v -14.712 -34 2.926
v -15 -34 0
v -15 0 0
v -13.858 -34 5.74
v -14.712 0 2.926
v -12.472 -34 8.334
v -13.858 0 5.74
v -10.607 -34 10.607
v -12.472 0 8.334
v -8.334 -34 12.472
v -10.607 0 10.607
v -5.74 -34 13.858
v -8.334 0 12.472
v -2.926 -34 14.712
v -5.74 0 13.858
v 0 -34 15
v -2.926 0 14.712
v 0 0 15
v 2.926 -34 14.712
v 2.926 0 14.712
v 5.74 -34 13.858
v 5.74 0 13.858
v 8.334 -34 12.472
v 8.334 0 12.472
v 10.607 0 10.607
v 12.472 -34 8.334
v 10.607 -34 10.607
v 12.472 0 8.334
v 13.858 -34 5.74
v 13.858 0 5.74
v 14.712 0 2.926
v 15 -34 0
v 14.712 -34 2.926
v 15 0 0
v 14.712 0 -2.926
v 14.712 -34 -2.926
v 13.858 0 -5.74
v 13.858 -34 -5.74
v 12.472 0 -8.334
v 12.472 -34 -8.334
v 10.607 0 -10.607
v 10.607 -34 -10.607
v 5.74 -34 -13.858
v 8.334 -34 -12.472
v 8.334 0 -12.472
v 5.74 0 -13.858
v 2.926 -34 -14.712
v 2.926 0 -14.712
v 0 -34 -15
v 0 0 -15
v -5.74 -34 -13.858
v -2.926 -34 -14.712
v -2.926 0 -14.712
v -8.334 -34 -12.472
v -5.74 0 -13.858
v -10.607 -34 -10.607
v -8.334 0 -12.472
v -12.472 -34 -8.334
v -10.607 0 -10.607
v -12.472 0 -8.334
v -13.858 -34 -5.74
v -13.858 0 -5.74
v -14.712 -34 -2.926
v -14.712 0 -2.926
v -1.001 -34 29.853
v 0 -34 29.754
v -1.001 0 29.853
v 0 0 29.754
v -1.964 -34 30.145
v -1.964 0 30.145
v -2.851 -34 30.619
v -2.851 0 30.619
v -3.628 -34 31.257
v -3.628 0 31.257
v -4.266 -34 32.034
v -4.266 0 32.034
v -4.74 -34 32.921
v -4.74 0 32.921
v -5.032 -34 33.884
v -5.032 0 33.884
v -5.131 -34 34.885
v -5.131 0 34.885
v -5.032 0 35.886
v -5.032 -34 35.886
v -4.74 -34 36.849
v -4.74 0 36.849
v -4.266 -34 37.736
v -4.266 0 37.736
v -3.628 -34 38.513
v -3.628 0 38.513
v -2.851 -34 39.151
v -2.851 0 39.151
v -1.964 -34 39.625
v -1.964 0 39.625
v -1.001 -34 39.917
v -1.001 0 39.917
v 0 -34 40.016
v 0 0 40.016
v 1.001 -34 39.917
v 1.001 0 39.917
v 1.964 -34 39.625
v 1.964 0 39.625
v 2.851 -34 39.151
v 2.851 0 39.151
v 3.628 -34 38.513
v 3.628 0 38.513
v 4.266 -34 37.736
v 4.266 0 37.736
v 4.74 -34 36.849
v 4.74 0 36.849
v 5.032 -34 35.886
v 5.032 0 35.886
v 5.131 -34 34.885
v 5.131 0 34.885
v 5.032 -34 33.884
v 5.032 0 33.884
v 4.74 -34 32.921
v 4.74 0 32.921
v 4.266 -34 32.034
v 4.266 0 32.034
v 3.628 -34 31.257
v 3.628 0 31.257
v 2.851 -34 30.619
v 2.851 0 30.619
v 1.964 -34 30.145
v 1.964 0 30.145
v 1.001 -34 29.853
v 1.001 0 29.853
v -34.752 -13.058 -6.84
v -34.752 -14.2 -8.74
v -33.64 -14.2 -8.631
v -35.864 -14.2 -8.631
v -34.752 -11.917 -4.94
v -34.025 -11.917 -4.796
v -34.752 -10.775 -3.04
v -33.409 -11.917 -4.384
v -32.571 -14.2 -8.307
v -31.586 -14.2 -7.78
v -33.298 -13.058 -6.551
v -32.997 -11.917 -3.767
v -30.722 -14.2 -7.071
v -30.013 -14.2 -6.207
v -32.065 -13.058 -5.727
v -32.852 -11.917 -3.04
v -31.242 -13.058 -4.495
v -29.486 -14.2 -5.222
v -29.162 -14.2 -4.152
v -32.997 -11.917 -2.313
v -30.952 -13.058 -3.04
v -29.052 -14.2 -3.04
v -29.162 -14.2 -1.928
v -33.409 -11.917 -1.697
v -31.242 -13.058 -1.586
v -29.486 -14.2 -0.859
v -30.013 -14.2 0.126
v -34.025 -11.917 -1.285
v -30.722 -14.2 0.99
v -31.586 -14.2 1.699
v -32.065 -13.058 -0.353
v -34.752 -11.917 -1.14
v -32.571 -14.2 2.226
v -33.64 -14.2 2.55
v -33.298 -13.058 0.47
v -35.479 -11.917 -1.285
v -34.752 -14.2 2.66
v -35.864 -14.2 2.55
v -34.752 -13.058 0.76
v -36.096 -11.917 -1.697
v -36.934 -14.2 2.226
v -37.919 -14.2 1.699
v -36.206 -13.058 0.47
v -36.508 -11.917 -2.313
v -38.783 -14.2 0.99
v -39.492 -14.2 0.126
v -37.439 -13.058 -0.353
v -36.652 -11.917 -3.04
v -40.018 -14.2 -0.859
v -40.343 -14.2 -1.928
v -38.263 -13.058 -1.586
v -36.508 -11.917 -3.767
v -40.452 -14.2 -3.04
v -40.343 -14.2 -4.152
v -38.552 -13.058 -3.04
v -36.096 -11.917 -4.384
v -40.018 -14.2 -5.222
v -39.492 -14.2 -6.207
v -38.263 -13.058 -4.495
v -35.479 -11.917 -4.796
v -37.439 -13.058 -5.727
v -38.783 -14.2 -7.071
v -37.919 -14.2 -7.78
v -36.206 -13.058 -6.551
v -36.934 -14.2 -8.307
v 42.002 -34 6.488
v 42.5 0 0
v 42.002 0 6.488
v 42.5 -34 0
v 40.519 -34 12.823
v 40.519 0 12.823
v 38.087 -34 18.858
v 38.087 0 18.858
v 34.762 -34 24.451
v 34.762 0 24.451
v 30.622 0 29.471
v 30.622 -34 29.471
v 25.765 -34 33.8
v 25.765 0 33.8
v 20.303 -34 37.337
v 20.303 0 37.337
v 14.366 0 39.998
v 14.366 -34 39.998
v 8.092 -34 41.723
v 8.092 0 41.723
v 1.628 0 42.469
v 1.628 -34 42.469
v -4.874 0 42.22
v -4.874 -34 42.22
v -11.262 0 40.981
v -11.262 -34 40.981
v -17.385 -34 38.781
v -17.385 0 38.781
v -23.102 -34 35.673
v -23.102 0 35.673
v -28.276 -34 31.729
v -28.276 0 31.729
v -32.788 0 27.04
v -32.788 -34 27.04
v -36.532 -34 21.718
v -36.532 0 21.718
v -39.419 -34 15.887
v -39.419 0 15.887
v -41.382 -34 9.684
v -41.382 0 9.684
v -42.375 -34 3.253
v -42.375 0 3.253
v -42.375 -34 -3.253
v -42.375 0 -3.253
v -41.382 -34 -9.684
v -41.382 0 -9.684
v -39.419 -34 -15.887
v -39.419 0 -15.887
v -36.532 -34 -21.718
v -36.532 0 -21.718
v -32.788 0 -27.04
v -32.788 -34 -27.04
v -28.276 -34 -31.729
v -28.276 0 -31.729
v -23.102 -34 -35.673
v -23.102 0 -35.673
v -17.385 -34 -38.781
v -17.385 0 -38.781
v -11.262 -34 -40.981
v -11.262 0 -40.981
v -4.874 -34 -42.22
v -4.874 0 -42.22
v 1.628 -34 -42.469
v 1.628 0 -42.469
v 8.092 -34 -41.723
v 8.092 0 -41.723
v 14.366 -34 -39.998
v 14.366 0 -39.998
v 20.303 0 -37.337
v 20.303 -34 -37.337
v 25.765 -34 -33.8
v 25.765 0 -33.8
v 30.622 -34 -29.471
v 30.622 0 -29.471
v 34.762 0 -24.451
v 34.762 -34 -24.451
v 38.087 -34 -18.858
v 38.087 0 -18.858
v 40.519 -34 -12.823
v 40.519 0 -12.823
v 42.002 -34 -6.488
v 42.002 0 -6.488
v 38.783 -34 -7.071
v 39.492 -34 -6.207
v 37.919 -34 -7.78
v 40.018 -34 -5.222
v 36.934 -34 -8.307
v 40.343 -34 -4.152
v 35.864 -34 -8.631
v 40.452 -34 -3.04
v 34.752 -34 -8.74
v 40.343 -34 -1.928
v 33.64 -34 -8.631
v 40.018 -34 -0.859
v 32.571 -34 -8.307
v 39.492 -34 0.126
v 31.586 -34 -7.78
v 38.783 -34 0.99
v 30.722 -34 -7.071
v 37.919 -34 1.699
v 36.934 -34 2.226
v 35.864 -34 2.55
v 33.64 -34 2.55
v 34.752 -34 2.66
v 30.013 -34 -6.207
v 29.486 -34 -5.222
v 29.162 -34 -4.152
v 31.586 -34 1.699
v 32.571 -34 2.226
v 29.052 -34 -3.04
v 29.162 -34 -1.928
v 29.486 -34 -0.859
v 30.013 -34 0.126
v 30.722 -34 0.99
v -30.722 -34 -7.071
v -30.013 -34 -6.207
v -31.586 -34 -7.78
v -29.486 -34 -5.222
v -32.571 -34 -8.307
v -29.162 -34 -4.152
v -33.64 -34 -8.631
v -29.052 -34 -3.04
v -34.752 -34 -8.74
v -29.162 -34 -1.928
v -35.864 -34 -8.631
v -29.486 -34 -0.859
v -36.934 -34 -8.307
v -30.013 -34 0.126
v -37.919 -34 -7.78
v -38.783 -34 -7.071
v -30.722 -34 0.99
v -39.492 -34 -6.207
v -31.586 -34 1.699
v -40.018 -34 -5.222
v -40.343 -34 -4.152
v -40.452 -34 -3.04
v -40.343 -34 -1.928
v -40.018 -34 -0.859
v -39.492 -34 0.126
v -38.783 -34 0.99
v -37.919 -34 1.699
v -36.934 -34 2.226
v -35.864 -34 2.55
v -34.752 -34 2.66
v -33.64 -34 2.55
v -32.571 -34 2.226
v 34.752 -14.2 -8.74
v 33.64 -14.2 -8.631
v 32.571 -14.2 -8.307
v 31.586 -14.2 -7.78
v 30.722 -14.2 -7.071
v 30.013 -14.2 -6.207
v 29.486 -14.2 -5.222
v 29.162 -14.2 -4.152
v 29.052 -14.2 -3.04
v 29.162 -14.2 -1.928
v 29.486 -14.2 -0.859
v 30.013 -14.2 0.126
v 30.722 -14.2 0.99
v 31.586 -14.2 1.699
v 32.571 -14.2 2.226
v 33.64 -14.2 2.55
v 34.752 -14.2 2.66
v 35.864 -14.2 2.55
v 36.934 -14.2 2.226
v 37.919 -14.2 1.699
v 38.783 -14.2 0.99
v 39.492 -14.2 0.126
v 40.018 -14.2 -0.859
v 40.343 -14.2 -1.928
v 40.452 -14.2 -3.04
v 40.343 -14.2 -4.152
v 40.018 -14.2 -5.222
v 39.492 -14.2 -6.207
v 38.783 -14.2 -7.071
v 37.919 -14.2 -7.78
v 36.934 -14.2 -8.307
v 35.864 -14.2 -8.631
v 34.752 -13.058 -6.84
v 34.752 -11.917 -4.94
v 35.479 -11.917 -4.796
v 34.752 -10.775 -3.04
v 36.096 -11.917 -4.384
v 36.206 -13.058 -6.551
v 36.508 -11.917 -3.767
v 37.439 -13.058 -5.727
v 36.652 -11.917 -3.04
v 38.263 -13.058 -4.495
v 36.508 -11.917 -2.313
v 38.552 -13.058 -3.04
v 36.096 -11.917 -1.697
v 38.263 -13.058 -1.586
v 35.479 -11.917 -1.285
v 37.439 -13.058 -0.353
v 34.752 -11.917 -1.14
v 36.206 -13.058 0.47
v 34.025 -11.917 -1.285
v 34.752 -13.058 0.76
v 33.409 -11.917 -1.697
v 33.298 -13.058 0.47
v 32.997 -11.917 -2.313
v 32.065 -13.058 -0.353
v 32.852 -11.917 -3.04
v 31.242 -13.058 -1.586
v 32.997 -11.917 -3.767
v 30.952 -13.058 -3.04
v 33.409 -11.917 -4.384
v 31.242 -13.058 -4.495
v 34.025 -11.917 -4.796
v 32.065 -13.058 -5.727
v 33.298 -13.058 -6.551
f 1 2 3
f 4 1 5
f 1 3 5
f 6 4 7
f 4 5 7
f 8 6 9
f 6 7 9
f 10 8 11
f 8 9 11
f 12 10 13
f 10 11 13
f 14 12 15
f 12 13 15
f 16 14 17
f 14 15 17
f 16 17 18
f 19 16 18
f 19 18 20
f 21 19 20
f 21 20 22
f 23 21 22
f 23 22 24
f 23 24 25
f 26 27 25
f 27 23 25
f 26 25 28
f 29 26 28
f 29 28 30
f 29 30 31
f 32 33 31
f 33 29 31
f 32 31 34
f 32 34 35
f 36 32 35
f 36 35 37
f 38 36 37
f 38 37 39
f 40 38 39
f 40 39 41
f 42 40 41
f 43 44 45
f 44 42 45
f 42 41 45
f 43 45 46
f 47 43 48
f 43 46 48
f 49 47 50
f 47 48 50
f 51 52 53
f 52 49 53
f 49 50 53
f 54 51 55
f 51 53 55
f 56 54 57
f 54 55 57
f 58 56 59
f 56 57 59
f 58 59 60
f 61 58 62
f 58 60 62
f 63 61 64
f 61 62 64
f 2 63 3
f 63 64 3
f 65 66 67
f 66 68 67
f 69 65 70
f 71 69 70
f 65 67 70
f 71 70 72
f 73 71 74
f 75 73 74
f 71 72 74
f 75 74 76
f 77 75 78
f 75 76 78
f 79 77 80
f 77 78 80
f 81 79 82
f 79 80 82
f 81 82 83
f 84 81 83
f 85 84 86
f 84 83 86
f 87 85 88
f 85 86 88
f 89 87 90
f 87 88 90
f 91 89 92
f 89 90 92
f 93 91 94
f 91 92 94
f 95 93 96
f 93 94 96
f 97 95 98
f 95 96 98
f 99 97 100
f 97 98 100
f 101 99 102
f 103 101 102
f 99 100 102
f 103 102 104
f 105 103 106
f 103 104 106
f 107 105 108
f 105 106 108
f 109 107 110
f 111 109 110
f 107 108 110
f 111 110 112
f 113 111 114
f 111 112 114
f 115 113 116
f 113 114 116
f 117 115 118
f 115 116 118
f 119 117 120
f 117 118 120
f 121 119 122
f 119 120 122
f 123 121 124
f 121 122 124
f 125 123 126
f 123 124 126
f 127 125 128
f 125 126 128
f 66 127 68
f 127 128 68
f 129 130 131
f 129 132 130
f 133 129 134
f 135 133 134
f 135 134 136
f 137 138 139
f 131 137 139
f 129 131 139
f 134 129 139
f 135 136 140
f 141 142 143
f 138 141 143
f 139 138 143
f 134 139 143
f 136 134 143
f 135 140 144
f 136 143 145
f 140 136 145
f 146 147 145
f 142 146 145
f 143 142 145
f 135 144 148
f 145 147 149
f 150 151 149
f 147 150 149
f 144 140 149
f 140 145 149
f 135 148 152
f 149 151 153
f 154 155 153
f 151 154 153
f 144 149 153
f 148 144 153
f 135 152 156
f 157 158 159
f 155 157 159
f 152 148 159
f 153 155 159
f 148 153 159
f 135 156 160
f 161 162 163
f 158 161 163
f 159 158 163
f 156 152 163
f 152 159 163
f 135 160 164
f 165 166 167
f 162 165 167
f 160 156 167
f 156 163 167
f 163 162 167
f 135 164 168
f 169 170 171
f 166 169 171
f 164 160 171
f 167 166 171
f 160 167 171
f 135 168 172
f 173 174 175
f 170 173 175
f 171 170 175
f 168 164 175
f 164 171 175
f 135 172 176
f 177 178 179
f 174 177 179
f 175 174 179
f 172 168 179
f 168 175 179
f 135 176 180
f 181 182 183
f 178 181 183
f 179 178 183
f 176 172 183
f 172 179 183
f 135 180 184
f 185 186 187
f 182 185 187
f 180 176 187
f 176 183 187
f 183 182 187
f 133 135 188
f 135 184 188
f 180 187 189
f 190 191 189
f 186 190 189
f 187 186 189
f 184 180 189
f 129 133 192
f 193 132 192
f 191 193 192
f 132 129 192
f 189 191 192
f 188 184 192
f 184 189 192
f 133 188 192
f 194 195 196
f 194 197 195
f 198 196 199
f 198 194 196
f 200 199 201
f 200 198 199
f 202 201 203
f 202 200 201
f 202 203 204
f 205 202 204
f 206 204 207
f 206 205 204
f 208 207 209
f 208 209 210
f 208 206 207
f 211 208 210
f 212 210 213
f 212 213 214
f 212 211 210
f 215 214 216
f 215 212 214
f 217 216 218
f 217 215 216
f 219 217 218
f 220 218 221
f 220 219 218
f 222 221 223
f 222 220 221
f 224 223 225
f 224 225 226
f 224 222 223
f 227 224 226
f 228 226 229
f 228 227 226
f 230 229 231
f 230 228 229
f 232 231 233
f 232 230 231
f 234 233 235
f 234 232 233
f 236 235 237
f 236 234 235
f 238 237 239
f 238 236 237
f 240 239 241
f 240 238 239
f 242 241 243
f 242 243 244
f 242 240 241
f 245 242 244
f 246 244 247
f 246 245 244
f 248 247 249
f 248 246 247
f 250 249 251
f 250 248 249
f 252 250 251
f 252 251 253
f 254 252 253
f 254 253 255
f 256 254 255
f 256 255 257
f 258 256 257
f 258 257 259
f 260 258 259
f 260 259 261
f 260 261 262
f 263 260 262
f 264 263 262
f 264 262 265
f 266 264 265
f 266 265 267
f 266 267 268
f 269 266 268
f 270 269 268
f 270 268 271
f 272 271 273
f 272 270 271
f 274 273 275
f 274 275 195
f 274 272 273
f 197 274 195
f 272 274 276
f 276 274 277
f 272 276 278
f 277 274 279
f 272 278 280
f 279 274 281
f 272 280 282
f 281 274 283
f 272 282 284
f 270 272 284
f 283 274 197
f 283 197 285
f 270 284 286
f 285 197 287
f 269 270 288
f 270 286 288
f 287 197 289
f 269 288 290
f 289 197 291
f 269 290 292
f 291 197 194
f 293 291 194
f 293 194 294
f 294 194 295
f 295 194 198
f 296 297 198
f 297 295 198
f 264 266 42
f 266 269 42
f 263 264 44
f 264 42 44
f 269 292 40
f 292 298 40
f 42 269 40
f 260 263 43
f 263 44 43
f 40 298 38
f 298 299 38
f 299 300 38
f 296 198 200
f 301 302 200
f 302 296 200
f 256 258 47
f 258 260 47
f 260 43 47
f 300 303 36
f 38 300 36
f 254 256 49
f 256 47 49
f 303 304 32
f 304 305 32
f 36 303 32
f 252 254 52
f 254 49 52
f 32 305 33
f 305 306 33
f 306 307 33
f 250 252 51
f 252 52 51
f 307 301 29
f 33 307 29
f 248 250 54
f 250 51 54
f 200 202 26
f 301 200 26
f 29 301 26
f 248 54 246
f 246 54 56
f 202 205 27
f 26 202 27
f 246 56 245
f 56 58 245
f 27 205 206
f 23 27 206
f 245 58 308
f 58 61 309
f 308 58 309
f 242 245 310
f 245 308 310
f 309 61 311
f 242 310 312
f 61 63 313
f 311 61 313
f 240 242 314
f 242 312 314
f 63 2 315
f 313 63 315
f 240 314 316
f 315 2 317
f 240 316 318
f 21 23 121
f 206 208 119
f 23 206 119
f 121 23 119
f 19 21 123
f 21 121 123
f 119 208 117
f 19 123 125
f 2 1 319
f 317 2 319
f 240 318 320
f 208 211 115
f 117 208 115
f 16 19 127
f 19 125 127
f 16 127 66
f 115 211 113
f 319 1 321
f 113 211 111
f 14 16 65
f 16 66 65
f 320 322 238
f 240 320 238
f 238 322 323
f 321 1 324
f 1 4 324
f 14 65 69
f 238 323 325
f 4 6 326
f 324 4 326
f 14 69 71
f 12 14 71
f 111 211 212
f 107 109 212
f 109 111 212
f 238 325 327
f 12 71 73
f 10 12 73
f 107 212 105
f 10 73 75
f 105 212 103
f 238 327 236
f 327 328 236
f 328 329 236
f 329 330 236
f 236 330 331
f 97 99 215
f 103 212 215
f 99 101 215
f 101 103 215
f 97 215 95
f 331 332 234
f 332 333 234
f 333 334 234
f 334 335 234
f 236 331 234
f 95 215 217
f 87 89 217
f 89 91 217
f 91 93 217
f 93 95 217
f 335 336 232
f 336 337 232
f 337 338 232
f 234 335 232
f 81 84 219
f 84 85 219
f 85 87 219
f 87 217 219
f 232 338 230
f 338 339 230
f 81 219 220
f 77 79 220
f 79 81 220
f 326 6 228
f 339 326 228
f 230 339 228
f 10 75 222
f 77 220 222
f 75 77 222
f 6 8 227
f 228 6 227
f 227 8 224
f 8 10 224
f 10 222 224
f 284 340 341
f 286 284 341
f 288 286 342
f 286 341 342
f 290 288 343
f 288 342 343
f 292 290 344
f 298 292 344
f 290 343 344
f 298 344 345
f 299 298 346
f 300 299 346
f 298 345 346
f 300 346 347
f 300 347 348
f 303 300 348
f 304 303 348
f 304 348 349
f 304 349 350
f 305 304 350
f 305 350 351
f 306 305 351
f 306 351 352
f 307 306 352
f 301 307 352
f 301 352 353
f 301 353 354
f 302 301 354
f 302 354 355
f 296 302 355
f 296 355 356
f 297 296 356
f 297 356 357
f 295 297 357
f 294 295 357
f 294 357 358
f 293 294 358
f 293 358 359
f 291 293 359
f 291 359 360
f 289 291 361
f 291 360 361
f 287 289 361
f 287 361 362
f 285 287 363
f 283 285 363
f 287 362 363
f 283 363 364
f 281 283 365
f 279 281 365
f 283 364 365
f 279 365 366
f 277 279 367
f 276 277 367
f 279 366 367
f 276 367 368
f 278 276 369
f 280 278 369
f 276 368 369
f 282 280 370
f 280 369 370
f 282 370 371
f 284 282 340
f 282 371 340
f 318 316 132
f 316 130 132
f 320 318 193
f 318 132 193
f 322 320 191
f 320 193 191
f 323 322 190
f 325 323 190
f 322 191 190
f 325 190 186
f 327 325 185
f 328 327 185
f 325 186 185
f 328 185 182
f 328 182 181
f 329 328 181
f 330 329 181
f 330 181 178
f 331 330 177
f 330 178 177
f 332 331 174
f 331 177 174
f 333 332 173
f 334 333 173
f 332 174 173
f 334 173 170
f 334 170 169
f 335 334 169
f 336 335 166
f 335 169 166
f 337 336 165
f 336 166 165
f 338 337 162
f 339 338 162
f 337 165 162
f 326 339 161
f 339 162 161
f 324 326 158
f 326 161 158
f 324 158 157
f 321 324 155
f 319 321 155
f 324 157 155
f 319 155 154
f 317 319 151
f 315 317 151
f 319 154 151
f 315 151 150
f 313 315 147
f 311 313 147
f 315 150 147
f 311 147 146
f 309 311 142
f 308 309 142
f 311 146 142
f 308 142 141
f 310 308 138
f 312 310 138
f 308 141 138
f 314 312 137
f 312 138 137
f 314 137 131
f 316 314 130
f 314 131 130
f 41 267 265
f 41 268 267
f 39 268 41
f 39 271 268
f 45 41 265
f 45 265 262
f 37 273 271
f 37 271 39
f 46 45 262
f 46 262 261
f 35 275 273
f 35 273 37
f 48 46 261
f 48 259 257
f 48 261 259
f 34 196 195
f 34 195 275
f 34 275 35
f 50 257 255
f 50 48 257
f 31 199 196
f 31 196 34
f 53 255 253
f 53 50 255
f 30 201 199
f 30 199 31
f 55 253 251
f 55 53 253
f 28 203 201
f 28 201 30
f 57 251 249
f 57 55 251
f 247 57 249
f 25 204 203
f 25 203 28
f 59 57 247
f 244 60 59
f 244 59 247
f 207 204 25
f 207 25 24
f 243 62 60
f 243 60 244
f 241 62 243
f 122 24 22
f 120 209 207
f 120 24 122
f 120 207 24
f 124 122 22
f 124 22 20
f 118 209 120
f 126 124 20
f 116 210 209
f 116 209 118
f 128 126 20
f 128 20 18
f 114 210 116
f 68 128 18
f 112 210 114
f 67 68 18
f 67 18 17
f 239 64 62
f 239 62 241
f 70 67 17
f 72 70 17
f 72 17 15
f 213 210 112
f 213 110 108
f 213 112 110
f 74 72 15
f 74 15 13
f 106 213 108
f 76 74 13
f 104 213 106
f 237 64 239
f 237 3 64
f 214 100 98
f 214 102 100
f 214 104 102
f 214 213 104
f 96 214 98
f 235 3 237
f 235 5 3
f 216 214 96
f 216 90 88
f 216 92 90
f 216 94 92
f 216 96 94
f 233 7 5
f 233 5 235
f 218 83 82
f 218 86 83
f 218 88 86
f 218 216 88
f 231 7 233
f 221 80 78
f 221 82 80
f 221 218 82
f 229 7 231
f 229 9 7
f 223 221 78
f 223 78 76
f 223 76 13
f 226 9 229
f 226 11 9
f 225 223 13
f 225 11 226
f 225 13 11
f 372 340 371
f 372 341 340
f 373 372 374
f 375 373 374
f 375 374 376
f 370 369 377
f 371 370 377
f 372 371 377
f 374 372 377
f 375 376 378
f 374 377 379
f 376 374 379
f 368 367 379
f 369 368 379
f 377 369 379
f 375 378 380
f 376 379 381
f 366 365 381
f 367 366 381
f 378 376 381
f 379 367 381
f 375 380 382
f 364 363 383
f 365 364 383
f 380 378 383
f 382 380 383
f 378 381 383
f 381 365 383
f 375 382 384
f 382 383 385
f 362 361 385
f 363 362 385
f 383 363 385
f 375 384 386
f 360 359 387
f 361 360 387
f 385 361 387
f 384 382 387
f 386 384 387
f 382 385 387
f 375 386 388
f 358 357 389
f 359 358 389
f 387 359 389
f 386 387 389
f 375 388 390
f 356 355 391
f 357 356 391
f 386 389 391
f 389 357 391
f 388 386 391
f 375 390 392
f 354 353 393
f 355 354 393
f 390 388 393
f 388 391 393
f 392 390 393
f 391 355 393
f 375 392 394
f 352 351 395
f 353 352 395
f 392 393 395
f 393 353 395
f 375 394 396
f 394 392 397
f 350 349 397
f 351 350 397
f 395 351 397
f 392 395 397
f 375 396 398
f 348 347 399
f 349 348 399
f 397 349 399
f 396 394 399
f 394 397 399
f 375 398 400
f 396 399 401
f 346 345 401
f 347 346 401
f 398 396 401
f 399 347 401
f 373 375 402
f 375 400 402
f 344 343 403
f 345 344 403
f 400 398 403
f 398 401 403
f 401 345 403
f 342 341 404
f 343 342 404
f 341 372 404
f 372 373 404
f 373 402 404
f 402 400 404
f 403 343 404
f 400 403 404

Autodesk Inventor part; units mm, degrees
ref_plane "YZ Plane" through (0, 0, 0) normal (1, 0, 0) x (0, 1, 0)
ref_plane "XZ Plane" through (0, 0, 0) normal (0, 1, 0) x (-1, 0, 0)
ref_plane "XY Plane" through (0, 0, 0) normal (0, 0, 1) x (1, 0, 0)
sketch "Schizzo1" plane through (0, 0, 0) normal (0, 1, 0) x (-1, 0, 0)
  circle A0 centre (0, 0) radius 15
  circle A1 centre (0, 0) radius 40
  dimension "d0" = 30
  dimension "d1" = 80
extrude "Estrusione1" add sketch "Schizzo1" against normal blind 34
sketch "Schizzo2" plane through (0, -34, 0) normal (0, -1, 0) x (1, 0, 0)
  circle A0 centre (0, 0) radius 15
  circle A1 centre (0, 0) radius 42.5
  dimension "d4" = 85
extrude "Estrusione2" add sketch "Schizzo2" against normal blind 34
sketch "Schizzo3" plane through (0, -34, 0) normal (0, -1, 0) x (1, 0, 0)
  circle A0 centre (0, 0) radius 34.885
  line L0 (0, 41.5801) -> (0, 0)
  line L1 (0, 0) -> (-42.3383, -3.7041)
  circle A1 centre (0, 0) radius 42.5 projected
  line L2 (42.3383, -3.7041) -> (0, 0)
  point P0 (-34.7523, -3.0404)
  point P1 (34.7523, -3.0404)
  dimension "d7" = 69.77
  dimension "d8" = 95
  dimension "d9" = 95
hole "Foro1" at (-34.7523, -34, -3.0404) at (34.7523, -34, -3.0404) direction (0, 1, 0) diameter 11.4 depth 19.8 tip angle 118 clearance for "Bullone a testa esagonale" size "7/16" standard "ANSI Unificate - Filettature"
sketch "Schizzo4" plane through (0, -34, 0) normal (0, -1, 0) x (1, 0, 0)
  circle A0 centre (0, 0) radius 34.885
  point P0 (0, 34.885)
  dimension "d17" = 69.77
hole "Foro2" at (0, -34, 34.885) direction (0, 1, 0) diameter 10.262 depth 34 tip angle 118 thread size "7/16-32 UN" class "2B" standard "ANSI Unified Screw Threads"
properties part number "forato" material "Ferro, Ghisa grigia ASTM A48 Grado 20"
